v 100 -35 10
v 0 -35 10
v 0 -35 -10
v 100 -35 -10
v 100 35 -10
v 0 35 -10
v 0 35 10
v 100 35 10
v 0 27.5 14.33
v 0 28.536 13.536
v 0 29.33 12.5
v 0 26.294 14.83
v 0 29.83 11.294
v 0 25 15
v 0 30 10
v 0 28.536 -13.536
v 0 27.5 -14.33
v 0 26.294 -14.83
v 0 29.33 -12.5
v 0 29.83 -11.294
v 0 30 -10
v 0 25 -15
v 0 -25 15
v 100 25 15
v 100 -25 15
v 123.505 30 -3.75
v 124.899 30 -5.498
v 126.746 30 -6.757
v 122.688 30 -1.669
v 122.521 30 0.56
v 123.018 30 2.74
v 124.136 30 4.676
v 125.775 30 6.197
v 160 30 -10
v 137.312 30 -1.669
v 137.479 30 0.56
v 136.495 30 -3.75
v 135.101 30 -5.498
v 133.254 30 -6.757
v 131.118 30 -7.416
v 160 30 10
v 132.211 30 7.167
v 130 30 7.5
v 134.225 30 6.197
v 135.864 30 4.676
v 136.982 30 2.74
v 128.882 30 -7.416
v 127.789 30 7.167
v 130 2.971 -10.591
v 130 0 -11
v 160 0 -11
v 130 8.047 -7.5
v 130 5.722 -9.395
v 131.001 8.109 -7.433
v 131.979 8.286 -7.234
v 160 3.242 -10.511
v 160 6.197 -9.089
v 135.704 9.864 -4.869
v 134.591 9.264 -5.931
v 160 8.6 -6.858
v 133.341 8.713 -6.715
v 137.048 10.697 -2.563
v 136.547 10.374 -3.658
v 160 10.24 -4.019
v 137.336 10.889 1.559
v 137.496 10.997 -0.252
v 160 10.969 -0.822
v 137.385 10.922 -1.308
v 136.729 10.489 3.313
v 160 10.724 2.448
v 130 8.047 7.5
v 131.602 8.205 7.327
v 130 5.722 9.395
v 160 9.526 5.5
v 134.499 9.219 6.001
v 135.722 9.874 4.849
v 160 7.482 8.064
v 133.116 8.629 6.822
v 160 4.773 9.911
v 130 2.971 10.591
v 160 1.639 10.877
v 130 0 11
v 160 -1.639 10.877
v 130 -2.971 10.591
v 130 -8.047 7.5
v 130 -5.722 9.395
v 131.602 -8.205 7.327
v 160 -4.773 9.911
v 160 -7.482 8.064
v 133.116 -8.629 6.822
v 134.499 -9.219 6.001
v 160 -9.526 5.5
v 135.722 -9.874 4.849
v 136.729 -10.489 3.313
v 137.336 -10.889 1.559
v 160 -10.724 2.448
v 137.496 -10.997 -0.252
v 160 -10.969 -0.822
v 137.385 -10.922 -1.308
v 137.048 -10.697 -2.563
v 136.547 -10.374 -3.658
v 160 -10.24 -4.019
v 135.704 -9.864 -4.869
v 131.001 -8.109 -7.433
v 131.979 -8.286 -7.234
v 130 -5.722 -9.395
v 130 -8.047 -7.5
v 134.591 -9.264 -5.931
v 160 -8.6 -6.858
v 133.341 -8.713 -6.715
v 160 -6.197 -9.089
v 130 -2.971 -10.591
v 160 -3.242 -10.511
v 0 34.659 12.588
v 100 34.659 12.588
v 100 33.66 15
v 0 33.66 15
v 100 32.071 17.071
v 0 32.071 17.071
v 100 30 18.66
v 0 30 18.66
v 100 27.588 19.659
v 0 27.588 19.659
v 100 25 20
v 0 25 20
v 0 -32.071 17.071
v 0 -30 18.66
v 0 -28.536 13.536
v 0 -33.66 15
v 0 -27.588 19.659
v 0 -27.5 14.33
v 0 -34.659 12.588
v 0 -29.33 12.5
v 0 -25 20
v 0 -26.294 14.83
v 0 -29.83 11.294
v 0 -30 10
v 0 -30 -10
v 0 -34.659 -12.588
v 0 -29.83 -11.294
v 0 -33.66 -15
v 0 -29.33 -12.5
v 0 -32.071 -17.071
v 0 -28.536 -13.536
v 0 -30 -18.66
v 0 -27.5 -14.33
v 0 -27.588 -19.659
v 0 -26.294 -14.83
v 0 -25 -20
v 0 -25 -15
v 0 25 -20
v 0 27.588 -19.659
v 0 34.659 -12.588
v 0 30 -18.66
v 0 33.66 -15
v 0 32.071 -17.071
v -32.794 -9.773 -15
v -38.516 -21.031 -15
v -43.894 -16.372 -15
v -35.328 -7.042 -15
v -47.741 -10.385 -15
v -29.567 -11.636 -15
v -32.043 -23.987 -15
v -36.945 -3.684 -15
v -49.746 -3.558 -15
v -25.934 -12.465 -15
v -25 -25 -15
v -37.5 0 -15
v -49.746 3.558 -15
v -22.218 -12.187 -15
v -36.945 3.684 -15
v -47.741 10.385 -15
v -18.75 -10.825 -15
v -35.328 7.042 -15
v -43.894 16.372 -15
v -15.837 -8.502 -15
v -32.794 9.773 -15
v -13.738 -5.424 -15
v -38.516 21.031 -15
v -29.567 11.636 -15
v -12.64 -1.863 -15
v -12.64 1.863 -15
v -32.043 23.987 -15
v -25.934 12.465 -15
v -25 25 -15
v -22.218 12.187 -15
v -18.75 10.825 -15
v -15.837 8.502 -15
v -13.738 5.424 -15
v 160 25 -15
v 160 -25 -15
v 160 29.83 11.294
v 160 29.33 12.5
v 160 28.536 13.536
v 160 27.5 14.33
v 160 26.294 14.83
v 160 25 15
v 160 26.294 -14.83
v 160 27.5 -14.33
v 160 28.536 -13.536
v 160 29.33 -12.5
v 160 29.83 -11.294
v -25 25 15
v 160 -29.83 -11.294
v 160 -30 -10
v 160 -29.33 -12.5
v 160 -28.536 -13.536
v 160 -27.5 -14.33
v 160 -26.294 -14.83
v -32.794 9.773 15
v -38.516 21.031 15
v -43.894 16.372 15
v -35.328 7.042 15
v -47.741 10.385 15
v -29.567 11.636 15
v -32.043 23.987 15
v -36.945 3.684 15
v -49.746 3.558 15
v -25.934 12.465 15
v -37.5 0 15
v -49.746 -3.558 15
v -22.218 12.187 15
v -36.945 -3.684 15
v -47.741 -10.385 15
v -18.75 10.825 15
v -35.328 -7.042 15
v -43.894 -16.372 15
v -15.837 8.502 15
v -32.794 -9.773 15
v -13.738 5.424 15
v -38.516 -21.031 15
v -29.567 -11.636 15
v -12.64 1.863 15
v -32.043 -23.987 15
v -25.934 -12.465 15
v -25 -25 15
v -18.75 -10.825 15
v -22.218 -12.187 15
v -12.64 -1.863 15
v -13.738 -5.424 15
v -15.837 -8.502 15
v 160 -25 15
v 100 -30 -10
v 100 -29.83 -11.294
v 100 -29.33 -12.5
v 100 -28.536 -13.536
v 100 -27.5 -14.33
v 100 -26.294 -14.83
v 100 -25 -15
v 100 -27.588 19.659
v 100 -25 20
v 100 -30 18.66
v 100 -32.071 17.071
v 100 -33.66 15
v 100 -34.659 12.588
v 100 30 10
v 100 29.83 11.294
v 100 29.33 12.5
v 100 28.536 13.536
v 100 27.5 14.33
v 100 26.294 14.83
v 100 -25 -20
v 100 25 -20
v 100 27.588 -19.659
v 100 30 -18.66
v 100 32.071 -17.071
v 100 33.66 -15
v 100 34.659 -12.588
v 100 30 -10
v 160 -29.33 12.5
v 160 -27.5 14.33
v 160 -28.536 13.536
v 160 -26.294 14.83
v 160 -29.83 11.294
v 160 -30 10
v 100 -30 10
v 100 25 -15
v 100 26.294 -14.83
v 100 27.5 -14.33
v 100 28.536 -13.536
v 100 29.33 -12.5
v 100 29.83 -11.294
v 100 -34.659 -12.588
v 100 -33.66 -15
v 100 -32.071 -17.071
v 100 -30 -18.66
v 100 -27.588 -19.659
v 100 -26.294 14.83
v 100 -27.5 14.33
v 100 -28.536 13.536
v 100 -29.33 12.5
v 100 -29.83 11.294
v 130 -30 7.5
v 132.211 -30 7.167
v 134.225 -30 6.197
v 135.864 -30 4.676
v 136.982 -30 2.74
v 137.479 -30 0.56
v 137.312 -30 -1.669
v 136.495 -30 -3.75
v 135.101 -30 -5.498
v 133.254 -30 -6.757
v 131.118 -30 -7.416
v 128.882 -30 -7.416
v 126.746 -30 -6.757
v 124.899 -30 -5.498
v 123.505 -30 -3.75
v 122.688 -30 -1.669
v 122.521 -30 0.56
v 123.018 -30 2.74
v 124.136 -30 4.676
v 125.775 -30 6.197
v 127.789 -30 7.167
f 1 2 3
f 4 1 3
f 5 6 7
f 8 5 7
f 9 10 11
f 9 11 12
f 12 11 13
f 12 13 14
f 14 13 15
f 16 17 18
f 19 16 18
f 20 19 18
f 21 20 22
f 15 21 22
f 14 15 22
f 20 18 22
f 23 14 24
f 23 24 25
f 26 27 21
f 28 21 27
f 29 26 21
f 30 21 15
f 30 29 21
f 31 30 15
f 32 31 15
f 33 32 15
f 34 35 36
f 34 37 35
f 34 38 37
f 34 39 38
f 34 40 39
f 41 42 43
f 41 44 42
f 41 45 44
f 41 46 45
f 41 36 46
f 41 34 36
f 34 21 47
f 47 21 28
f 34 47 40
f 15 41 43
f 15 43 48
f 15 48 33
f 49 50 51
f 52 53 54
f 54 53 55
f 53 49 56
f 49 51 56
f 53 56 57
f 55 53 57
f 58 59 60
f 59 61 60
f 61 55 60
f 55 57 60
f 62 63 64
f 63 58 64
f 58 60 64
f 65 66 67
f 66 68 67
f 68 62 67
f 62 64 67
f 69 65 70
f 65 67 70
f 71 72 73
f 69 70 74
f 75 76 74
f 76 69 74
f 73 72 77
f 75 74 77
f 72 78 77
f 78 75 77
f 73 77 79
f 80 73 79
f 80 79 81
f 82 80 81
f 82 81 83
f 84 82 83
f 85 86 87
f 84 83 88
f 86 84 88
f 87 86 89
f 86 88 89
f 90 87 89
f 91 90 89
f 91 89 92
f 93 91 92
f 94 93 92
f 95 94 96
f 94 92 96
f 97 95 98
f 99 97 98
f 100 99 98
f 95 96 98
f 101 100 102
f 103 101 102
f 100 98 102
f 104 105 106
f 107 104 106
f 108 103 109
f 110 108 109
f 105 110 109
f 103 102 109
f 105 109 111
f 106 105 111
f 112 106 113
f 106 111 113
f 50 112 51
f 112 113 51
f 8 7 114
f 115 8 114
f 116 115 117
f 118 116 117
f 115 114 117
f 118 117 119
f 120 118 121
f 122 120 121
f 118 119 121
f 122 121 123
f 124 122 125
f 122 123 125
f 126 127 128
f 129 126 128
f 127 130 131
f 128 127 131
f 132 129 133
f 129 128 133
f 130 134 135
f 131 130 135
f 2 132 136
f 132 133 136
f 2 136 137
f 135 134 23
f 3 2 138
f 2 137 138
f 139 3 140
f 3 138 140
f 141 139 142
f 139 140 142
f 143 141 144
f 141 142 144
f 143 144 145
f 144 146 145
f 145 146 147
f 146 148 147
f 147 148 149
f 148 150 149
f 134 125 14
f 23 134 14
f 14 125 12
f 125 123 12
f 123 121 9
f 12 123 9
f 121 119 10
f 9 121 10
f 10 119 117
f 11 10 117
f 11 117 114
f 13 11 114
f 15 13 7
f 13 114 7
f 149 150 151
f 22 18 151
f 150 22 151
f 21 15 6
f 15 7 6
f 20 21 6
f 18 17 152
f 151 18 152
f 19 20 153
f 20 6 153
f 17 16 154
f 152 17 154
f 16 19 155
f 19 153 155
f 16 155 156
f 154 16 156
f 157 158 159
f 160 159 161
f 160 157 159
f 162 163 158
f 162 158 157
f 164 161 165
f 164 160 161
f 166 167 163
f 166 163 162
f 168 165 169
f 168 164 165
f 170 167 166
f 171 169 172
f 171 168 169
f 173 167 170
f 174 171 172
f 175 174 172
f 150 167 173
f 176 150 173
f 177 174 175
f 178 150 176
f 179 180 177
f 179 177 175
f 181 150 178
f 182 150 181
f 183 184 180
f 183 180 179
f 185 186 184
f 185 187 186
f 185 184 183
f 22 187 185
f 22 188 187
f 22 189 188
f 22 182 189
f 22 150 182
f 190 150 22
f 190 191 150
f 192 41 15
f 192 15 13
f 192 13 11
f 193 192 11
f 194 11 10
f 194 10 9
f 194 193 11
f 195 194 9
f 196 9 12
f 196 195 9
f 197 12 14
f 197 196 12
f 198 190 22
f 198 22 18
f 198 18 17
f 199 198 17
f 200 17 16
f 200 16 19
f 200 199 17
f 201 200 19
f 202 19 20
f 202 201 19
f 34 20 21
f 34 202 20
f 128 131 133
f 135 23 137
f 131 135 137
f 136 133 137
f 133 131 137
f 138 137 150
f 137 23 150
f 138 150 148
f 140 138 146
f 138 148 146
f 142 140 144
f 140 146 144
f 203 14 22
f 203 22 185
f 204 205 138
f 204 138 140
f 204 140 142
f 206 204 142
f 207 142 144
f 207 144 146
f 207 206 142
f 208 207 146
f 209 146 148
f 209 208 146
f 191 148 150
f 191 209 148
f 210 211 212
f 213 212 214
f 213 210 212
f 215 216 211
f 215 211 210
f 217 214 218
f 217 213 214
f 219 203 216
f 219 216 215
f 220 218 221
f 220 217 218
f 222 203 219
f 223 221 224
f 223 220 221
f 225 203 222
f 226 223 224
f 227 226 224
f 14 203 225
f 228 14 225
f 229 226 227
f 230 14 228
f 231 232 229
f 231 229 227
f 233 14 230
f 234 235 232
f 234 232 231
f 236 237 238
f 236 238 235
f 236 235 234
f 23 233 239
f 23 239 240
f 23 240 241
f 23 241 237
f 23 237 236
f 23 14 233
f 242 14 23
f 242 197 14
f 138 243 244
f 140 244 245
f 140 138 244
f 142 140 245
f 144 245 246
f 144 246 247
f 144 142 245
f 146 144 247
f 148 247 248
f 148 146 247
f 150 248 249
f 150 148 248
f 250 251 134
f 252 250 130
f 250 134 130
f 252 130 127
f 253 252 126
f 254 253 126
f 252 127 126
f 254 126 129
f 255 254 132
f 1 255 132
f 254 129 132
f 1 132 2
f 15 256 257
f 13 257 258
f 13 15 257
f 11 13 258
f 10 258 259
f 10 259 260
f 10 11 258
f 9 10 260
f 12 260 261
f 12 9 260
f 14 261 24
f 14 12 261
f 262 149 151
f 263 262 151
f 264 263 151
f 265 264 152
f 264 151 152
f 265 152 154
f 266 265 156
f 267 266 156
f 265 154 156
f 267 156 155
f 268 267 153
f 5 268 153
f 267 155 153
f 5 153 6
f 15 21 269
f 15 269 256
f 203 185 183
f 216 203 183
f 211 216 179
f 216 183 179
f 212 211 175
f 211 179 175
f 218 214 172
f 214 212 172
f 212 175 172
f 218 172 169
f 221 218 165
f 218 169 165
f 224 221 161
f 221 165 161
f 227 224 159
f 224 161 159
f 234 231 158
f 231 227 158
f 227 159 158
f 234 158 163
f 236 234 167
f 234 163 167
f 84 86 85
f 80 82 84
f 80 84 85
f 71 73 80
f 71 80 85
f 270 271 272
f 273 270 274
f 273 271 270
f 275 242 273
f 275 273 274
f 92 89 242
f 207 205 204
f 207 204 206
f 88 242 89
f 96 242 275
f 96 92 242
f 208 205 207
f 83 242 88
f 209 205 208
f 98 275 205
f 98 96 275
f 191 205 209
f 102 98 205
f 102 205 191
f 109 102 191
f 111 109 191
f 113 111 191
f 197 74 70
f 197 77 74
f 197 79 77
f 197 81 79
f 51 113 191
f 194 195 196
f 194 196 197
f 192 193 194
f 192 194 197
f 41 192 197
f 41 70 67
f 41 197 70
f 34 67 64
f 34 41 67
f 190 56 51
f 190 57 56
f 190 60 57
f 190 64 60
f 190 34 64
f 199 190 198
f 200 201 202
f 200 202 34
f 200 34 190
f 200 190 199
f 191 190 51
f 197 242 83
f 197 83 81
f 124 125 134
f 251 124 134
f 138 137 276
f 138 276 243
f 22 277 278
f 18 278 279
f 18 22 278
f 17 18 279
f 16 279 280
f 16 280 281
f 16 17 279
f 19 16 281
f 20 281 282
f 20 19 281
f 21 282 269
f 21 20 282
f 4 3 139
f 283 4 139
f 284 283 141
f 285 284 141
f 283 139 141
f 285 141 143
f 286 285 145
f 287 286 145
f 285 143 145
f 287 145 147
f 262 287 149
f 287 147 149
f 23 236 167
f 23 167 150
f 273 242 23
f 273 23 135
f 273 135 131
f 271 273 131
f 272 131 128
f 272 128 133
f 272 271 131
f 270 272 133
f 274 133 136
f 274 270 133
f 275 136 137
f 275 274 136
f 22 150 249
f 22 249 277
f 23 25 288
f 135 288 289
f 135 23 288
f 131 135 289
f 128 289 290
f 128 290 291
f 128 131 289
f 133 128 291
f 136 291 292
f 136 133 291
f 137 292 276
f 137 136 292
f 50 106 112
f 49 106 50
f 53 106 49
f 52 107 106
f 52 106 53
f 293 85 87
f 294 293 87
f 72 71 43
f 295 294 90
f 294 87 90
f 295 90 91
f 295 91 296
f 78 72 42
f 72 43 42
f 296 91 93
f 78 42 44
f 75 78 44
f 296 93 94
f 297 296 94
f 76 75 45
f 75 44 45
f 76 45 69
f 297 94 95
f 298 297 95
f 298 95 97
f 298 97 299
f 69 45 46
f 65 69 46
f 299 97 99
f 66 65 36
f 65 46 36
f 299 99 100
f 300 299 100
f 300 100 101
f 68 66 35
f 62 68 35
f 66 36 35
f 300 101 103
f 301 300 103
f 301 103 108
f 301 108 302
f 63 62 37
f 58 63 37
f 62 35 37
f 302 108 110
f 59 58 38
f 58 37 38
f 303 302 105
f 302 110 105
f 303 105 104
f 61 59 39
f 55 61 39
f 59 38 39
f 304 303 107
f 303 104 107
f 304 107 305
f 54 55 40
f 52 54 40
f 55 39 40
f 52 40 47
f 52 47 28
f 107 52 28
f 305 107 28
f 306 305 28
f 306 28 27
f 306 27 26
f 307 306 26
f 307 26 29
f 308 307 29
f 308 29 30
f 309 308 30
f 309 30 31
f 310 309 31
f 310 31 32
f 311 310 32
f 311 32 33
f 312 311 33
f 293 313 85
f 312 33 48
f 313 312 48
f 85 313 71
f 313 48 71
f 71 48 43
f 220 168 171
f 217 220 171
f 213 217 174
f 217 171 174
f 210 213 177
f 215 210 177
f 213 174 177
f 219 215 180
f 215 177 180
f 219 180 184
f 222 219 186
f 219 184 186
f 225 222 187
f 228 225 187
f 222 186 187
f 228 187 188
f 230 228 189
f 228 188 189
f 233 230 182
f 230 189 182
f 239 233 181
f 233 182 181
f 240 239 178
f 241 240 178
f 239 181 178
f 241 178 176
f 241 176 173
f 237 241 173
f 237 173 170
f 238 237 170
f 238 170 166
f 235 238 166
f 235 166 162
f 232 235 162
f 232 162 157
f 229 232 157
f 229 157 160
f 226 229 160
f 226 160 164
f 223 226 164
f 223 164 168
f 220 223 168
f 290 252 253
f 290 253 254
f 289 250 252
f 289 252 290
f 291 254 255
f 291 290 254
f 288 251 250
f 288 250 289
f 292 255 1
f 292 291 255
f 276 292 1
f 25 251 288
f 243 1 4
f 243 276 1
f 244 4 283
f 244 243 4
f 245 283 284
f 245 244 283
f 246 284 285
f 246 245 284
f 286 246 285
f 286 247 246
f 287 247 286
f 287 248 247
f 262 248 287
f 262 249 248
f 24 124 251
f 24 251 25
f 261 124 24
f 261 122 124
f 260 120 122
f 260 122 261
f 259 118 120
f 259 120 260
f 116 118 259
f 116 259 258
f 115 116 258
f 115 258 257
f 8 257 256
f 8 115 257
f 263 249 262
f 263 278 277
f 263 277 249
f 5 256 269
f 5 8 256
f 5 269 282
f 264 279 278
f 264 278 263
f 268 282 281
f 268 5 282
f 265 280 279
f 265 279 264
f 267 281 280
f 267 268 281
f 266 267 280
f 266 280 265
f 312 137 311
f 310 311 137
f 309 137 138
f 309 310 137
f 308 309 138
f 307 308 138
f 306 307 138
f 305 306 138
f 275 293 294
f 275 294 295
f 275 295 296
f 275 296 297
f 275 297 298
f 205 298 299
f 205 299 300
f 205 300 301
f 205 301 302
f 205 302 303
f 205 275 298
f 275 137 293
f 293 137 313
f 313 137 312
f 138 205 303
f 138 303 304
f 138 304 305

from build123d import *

# Parameters (mm, degrees)
STRUCTURAL_MEMBER1_DEPTH = 100
BOSS_EXTRUDE1_DEPTH      = 60
BOSS_EXTRUDE1_DEPTH_BACK = 150
SKETCH20_R               = 11
CUT_EXTRUDE6_DEPTH       = 30
SKETCH21_R               = 7.5
CUT_EXTRUDE7_DEPTH       = 174.853386507
CUT_EXTRUDE11_DEPTH      = 168.48134234
CUT_EXTRUDE11_DEPTH_BACK = 168.48134234
SKETCH23_R               = 12.5
CUT_EXTRUDE12_DEPTH      = 168.48134234


with BuildPart() as part:
    # Sketch11 → Structural Member1 (new body)
    with BuildSketch(Plane(origin=(0, 0, 0), x_dir=(0, 0, -1), z_dir=(1, 0, 0))):
        with BuildLine():
            Line((-10, -35), (10, -35))
            ThreePointArc((10, -35), (17.071067812, -32.071067812), (20, -25))
            Line((20, -25), (20, 25))
            ThreePointArc((20, 25), (17.071067812, 32.071067812), (10, 35))
            Line((10, 35), (-10, 35))
            ThreePointArc((-10, 35), (-17.071067812, 32.071067812), (-20, 25))
            Line((-20, 25), (-20, -25))
            ThreePointArc((-20, -25), (-17.071067812, -32.071067812), (-10, -35))
        make_face()
        with BuildLine():
            Line((-10, -30), (10, -30))
            ThreePointArc((10, -30), (13.535533906, -28.535533906), (15, -25))
            Line((15, -25), (15, 25))
            ThreePointArc((15, 25), (13.535533906, 28.535533906), (10, 30))
            Line((10, 30), (-10, 30))
            ThreePointArc((-10, 30), (-13.535533906, 28.535533906), (-15, 25))
            Line((-15, 25), (-15, -25))
            ThreePointArc((-15, -25), (-13.535533906, -28.535533906), (-10, -30))
        make_face(mode=Mode.SUBTRACT)
    extrude(amount=STRUCTURAL_MEMBER1_DEPTH)


with BuildPart() as body_2:
    # Sketch16 → Boss-Extrude1 (new, two sides)
    with BuildSketch(Plane(origin=(100, 0, 0), x_dir=(0, 0, -1), z_dir=(1, 0, 0))) as boss_extrude1_sk:
        with BuildLine():
            Line((15, -25), (15, 25))
            ThreePointArc((15, 25), (13.535533906, 28.535533906), (10, 30))
            Line((10, 30), (-10, 30))
            ThreePointArc((-10, 30), (-13.535533906, 28.535533906), (-15, 25))
            Line((-15, 25), (-15, -25))
            ThreePointArc((-15, -25), (-13.535533906, -28.535533906), (-10, -30))
            Line((-10, -30), (10, -30))
            ThreePointArc((10, -30), (13.535533906, -28.535533906), (15, -25))
        make_face()
    extrude(amount=BOSS_EXTRUDE1_DEPTH)
    extrude(boss_extrude1_sk.sketch, amount=-BOSS_EXTRUDE1_DEPTH_BACK)

    # Sketch20 → Cut-Extrude6 (cut)
    with BuildSketch(Plane(origin=(160, 0, 0), x_dir=(0, 0, -1), z_dir=(1, 0, 0))):
        Circle(SKETCH20_R)
    extrude(amount=-CUT_EXTRUDE6_DEPTH, mode=Mode.SUBTRACT)

    # Sketch21 → Cut-Extrude7 (cut, through all)
    with BuildSketch(Plane(origin=(0, 30, 0), x_dir=(1, 0, 0), z_dir=(0, 1, 0))):
        with Locations(Location((130, 0, 0), (0, 0, 270))):
            Circle(SKETCH21_R)
    extrude(amount=-CUT_EXTRUDE7_DEPTH, mode=Mode.SUBTRACT)

    # Sketch22 → Cut-Extrude11 (cut, two sides)
    with BuildSketch(Plane(origin=(0, 0, -15), x_dir=(-1, 0, 0), z_dir=(0, 0, -1))) as cut_extrude11_sk:
        with BuildLine():
            Line((0, 394.284984115), (0, 35))
            Line((0, 35), (0, 25))
            Line((0, 25), (25, 25))
            ThreePointArc((25, 25), (50, 0), (25, -25))
            Line((25, -25), (0, -25))
            Line((0, -25), (0, -30))
            Line((0, -30), (0, -389.284984115))
            Line((0, -389.284984115), (718.569968229, -389.284984115))
            Line((718.569968229, -389.284984115), (718.569968229, 394.284984115))
            Line((718.569968229, 394.284984115), (0, 394.284984115))
        make_face()
    extrude(amount=CUT_EXTRUDE11_DEPTH, mode=Mode.SUBTRACT)
    extrude(cut_extrude11_sk.sketch, amount=-CUT_EXTRUDE11_DEPTH_BACK, mode=Mode.SUBTRACT)

    # Sketch23 → Cut-Extrude12 (cut, through all)
    with BuildSketch(Plane(origin=(0, 0, -15), x_dir=(-1, 0, 0), z_dir=(0, 0, -1))):
        with Locations((25, 0)):
            Circle(SKETCH23_R)
    extrude(amount=-CUT_EXTRUDE12_DEPTH, mode=Mode.SUBTRACT)


solid = Compound([part.part, body_2.part])
